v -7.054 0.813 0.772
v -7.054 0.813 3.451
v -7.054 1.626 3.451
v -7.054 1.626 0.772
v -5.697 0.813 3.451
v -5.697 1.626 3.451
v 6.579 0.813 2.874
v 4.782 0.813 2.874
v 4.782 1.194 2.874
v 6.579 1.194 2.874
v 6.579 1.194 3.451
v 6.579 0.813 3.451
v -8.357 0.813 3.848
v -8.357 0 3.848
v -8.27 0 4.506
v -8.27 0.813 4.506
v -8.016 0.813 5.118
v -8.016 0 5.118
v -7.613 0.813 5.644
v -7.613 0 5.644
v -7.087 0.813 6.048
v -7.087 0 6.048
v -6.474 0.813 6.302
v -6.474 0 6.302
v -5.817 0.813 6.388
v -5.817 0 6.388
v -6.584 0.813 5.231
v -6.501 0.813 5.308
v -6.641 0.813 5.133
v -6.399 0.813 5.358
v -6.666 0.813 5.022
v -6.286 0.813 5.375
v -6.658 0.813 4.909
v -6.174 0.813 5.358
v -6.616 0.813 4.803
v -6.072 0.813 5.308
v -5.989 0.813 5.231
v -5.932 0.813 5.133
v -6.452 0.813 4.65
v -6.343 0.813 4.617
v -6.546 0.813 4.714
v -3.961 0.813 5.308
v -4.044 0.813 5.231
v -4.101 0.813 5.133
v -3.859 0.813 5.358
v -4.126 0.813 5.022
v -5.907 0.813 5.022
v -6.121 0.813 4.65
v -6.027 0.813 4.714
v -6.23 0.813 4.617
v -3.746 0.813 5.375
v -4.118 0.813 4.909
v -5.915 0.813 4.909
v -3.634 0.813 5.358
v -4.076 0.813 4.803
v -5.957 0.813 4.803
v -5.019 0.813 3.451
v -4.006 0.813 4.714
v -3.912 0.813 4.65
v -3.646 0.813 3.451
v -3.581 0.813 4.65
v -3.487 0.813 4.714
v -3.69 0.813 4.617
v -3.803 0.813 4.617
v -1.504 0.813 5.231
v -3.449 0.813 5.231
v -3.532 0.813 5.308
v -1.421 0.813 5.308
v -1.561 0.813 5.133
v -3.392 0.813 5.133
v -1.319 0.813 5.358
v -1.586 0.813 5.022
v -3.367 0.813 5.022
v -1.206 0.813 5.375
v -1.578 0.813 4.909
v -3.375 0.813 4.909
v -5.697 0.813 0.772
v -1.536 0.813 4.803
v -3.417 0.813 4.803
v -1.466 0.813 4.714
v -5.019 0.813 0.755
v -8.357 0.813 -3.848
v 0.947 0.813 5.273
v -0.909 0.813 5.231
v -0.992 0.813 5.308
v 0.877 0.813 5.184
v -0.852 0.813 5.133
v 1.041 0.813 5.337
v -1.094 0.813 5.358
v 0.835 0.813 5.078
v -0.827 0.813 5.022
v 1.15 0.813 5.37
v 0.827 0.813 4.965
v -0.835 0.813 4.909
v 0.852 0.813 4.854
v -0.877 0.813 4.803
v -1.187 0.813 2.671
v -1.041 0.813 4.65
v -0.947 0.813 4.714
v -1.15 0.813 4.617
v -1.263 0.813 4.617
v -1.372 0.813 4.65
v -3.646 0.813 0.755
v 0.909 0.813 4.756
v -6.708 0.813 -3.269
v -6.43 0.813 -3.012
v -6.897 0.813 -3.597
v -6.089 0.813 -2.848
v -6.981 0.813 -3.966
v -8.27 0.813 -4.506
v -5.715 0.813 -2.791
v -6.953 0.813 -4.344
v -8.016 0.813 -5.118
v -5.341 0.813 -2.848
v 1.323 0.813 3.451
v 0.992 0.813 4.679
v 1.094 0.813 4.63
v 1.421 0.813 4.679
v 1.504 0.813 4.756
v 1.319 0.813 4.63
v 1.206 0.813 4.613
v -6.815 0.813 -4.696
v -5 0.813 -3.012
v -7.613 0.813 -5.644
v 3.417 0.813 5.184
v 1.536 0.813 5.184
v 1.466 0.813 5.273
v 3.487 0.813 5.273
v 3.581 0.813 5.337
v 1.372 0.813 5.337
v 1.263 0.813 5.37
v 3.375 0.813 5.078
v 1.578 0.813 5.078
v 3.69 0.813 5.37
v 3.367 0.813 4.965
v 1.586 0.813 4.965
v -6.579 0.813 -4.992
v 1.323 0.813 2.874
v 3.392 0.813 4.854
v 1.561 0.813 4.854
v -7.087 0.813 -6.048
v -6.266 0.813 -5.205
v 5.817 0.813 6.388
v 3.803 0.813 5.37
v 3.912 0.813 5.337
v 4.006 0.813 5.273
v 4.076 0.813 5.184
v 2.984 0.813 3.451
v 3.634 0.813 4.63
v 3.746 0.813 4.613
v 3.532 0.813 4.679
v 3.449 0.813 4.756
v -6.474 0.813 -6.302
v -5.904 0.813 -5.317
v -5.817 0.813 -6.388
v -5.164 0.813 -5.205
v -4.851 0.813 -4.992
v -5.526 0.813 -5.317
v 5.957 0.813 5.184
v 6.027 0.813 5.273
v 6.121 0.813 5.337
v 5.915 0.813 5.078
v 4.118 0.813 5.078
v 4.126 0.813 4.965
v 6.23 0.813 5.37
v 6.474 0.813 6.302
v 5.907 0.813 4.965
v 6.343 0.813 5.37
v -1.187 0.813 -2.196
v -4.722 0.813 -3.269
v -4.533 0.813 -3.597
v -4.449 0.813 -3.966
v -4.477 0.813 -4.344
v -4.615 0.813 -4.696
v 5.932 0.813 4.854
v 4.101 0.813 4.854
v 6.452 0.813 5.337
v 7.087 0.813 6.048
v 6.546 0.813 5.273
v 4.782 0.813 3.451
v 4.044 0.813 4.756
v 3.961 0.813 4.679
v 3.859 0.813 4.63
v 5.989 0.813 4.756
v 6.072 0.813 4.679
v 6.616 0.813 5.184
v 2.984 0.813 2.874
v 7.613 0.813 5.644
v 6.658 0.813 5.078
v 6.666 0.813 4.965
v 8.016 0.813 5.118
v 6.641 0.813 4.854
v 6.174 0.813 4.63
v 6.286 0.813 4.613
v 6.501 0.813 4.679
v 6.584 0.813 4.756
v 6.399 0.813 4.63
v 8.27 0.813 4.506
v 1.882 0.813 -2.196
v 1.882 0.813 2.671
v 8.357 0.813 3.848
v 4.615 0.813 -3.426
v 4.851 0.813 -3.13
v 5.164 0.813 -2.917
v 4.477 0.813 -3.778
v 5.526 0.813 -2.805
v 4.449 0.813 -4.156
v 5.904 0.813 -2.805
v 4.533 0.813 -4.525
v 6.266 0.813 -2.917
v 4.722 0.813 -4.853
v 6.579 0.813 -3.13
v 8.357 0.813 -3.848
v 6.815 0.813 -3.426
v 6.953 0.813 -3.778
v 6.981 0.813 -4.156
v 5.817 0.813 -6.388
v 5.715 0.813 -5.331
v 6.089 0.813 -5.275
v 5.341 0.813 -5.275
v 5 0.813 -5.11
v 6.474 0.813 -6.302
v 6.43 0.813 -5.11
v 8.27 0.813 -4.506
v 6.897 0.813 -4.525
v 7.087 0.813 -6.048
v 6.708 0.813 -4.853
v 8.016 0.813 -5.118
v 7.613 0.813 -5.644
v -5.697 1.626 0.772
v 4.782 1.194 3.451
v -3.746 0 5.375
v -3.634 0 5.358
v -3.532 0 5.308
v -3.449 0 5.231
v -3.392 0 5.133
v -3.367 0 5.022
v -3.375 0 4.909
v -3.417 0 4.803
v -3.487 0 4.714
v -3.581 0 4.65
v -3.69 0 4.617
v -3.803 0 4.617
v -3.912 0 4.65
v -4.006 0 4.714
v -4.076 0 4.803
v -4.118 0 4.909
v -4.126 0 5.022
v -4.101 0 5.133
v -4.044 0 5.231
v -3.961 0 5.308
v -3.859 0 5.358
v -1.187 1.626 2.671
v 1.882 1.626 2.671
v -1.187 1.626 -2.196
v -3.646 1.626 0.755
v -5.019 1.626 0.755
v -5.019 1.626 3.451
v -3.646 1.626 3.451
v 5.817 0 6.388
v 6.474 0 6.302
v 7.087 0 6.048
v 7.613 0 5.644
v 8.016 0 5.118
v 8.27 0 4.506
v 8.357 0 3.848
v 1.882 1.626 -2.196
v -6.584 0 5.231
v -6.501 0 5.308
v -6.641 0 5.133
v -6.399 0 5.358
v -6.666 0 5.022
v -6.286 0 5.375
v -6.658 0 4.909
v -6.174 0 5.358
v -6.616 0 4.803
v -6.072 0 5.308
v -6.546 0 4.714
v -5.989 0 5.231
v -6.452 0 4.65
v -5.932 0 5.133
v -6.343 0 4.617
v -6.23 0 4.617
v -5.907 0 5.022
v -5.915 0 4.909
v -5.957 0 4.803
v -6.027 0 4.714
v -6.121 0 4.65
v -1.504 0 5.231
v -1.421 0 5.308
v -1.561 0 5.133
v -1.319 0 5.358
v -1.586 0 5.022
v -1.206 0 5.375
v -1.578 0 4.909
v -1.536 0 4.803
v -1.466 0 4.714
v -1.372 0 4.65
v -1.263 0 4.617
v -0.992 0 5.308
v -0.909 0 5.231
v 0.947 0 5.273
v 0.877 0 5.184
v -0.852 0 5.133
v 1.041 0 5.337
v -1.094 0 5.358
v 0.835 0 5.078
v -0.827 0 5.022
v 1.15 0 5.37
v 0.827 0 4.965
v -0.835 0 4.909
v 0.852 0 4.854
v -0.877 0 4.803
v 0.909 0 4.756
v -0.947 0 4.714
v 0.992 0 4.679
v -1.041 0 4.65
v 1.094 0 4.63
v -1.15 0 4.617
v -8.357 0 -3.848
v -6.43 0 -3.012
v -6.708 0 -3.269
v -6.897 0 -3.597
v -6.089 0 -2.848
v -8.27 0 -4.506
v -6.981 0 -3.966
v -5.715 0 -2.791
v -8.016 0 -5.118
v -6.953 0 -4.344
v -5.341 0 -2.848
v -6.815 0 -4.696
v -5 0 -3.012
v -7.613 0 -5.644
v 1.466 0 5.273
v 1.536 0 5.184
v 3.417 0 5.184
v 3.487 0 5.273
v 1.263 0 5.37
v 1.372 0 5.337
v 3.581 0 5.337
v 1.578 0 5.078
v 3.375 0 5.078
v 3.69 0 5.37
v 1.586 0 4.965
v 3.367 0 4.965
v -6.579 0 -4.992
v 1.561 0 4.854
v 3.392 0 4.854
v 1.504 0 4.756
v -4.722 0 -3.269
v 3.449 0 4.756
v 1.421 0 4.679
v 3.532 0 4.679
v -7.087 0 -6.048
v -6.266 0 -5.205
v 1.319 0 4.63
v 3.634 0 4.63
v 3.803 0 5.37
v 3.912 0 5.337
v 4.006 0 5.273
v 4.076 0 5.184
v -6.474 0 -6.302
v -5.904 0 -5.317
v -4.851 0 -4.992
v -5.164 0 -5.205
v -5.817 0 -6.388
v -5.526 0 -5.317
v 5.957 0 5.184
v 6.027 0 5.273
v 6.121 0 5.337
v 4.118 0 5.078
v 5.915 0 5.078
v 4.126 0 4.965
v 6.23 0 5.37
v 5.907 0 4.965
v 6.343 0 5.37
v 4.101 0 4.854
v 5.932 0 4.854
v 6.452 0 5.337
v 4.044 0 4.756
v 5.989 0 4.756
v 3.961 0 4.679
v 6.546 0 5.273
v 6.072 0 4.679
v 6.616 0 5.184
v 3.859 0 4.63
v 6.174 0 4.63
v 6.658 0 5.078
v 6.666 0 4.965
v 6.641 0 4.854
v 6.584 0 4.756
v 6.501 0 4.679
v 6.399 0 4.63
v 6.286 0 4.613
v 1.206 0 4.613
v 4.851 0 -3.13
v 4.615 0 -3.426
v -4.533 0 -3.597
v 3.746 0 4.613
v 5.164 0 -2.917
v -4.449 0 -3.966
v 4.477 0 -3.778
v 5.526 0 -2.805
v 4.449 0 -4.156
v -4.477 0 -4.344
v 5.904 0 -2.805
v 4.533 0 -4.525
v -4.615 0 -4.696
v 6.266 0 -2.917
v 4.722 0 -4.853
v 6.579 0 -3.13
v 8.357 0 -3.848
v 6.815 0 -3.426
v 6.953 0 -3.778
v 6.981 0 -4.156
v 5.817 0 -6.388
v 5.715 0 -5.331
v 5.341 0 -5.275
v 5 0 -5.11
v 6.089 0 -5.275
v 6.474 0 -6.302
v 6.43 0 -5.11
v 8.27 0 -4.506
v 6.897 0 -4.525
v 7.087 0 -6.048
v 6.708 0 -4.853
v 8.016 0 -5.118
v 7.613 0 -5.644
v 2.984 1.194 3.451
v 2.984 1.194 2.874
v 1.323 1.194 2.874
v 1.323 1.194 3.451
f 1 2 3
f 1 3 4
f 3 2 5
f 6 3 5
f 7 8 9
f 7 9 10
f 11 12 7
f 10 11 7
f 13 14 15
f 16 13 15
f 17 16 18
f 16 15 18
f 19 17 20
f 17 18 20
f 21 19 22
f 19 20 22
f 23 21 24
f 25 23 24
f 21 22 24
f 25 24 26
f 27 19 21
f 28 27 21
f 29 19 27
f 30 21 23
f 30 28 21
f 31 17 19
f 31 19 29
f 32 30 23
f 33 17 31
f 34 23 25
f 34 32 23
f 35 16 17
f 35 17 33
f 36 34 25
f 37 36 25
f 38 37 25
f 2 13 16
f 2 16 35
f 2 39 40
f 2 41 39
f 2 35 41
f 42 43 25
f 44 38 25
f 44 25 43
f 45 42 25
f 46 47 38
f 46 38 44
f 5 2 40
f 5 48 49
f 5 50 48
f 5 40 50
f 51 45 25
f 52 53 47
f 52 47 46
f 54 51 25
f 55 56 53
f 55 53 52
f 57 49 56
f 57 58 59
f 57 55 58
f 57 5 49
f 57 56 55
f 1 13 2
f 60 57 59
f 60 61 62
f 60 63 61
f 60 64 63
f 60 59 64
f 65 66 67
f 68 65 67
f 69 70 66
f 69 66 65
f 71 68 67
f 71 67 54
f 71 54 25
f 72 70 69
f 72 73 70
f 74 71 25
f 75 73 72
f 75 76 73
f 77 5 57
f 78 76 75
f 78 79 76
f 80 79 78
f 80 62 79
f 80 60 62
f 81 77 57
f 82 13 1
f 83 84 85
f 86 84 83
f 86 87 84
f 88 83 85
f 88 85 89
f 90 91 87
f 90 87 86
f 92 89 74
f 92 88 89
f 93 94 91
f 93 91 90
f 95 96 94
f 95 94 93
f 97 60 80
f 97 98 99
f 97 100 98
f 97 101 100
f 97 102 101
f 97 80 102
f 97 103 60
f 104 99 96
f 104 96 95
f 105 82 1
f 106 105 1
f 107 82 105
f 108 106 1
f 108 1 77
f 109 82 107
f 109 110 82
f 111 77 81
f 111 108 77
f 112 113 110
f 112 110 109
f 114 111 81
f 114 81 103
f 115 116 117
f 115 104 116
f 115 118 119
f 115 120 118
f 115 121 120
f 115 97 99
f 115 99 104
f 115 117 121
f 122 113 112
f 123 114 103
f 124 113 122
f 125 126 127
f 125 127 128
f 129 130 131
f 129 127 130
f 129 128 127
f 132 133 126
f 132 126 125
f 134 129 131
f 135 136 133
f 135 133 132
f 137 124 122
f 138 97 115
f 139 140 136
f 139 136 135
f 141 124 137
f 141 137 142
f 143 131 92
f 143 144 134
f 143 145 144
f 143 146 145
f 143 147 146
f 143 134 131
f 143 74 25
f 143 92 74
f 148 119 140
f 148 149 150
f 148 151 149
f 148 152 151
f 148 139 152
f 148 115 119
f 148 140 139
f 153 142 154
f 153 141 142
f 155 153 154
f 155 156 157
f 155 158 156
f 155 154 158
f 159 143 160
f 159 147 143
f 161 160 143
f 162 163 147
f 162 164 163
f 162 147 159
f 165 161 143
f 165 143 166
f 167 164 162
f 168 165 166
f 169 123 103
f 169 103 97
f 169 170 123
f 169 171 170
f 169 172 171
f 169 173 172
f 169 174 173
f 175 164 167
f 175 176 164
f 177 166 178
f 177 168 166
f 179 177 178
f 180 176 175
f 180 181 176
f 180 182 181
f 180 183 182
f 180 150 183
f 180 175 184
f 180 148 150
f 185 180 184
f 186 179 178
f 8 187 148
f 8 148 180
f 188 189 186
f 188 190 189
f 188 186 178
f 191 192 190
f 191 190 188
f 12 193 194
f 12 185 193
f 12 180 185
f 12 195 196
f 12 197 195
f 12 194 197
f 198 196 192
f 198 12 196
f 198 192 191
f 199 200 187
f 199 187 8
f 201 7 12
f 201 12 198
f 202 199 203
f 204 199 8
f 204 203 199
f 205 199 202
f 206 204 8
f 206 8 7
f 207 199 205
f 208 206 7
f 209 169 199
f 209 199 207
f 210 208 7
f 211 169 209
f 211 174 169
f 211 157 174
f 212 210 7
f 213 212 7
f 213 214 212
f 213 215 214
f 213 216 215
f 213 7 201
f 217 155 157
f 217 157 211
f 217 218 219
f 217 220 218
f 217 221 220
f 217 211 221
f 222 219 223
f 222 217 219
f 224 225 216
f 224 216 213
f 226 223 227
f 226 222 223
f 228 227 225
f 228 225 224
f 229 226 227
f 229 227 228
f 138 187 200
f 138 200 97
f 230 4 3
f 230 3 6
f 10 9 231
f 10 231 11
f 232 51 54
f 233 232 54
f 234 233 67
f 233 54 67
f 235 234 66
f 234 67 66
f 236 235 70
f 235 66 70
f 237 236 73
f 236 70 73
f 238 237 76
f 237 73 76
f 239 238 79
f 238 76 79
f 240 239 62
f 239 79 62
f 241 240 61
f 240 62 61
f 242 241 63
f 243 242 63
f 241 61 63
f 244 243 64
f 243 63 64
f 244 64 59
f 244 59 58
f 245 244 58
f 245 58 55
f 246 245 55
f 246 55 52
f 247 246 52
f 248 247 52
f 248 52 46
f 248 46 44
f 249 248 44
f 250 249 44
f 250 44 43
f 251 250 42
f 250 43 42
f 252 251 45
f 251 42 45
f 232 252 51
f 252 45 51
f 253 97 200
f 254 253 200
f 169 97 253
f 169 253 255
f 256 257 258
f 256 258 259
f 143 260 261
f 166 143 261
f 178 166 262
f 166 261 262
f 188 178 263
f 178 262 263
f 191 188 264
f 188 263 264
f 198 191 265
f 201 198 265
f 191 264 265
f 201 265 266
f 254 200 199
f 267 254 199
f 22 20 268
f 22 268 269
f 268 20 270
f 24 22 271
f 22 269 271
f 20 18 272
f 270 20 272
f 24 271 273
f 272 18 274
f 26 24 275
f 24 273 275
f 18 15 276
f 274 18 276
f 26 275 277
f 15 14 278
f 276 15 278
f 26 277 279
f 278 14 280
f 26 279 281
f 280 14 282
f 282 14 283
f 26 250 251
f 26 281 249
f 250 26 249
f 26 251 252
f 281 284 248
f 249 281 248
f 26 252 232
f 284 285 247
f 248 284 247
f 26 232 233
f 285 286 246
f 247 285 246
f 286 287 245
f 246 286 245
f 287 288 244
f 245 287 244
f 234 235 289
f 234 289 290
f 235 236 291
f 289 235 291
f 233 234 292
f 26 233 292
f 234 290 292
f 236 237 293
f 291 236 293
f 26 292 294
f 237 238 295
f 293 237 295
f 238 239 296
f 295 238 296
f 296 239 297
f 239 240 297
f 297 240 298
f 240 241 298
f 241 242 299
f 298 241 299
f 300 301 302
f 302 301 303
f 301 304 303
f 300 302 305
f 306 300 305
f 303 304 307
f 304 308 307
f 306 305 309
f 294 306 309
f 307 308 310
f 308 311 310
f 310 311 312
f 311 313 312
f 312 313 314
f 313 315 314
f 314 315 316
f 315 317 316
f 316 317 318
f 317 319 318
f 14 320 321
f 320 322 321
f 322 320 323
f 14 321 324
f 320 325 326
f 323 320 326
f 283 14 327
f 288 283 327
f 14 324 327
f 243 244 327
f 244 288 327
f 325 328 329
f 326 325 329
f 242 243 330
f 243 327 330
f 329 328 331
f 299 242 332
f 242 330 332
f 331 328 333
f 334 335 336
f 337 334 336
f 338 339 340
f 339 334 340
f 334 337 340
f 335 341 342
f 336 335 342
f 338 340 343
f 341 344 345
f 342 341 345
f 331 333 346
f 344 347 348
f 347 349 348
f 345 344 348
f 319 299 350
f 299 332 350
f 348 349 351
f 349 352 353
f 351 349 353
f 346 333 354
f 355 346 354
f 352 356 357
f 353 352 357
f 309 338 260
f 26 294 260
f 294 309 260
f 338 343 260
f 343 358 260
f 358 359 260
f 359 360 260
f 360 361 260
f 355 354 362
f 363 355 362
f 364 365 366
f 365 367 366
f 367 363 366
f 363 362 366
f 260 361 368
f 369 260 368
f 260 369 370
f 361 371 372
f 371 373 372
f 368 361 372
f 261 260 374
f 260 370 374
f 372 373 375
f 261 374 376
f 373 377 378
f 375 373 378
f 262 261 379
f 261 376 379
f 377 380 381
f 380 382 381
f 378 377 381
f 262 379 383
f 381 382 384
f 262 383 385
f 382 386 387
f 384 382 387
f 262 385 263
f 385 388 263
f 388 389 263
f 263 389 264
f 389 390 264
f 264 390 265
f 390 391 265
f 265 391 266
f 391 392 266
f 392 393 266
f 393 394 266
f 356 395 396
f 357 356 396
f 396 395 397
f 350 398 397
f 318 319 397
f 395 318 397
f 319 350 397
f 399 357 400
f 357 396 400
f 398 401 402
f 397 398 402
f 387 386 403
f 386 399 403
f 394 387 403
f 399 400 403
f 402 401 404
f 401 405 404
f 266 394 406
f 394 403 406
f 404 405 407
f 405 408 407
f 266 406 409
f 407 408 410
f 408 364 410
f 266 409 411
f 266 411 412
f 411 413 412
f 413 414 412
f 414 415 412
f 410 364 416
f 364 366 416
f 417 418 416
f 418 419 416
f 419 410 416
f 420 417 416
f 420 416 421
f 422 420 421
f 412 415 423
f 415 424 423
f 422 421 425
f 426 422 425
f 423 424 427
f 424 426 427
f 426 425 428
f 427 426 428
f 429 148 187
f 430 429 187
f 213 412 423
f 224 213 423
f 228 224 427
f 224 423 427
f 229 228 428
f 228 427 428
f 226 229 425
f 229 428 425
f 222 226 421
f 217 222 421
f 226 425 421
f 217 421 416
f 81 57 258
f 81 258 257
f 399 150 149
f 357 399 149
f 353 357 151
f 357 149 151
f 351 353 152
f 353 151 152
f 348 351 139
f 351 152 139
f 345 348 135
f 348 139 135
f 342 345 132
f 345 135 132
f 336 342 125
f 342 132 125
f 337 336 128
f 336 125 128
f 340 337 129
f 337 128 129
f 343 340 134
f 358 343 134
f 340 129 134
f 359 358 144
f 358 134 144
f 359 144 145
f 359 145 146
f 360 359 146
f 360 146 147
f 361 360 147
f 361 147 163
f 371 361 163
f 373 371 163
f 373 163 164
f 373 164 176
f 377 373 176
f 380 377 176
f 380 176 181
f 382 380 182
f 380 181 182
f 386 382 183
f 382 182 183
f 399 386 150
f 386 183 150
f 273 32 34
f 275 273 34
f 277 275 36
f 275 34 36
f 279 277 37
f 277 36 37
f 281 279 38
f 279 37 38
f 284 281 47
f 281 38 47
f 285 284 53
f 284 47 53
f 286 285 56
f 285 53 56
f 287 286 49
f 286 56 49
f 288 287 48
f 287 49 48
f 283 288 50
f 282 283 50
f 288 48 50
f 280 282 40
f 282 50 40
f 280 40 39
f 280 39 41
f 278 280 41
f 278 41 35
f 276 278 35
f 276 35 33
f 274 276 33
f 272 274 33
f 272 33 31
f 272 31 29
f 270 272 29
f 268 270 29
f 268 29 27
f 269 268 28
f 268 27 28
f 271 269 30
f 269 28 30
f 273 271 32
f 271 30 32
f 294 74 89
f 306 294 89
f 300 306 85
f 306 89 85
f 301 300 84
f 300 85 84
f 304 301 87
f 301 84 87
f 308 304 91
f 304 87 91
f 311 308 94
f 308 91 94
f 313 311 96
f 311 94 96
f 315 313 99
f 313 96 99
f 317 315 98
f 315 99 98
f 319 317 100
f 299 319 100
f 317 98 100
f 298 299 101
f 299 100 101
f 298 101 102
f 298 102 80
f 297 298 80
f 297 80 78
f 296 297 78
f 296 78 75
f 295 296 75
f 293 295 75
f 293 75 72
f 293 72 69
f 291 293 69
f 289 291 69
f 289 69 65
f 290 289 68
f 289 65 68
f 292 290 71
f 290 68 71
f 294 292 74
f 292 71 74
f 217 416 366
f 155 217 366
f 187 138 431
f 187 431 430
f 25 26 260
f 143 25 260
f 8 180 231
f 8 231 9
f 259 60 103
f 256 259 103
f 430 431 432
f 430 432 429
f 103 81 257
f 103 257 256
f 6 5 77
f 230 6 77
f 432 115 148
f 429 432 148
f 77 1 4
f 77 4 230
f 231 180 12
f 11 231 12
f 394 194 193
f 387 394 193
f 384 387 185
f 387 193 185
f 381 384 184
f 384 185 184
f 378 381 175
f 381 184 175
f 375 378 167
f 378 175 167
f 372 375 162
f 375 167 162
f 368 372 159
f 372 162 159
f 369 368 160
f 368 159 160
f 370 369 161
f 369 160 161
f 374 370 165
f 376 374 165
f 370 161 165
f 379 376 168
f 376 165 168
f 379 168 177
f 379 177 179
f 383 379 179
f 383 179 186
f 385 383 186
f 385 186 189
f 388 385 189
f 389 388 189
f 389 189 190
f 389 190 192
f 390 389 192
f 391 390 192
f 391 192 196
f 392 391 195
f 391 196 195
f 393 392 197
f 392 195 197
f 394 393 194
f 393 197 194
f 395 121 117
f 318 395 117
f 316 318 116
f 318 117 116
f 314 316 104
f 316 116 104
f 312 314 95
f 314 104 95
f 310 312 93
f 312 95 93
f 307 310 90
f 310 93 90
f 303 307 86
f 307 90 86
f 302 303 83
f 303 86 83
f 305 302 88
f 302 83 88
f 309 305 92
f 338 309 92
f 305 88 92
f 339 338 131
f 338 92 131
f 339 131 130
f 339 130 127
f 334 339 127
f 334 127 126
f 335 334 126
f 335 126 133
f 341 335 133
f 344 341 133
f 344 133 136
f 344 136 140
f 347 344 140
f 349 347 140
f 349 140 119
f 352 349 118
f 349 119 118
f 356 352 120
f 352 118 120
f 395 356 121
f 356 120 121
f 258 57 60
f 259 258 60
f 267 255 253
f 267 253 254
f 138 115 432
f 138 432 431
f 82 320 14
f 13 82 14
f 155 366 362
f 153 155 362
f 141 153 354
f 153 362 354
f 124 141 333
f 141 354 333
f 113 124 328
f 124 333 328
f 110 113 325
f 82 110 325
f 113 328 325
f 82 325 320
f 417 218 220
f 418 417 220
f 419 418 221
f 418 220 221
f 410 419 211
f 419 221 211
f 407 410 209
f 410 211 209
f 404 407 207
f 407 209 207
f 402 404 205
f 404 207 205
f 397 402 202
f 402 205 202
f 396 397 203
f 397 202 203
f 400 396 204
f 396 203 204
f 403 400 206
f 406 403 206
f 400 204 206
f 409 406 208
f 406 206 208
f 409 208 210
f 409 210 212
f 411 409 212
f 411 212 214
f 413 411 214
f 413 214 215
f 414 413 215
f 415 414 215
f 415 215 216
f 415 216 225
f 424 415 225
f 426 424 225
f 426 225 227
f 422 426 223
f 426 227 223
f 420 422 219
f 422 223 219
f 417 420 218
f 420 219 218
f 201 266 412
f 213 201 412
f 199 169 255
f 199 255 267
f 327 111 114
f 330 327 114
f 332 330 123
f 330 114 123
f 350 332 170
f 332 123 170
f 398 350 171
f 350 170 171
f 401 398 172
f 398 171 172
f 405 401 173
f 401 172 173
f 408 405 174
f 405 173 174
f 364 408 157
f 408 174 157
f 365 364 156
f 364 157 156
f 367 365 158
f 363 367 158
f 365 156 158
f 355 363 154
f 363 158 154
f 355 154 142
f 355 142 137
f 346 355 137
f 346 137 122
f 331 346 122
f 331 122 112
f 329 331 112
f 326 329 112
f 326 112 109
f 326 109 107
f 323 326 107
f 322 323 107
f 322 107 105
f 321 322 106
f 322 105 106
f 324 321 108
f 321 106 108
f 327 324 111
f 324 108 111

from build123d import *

# Parameters (mm, degrees)
BOSS_EXTRUDE1_DEPTH = 0.8128
SKETCH2_R           = 0.381
SKETCH2_R_2         = 1.27
CUT_EXTRUDE1_DEPTH  = 0.8128
SKETCH4_W           = 3.069128824
SKETCH4_H           = 4.866519185
SKETCH4_W_2         = 1.37347754
SKETCH4_H_2         = 2.696085542
SKETCH4_W_3         = 1.356521027
SKETCH4_H_3         = 2.679129029
BOSS_EXTRUDE2_DEPTH = 0.8128
SKETCH4_3_W         = 1.661738258
SKETCH4_3_H         = 0.576521436
SKETCH4_3_W_2       = 1.797390361
BOSS_EXTRUDE3_DEPTH = 0.381


with BuildPart() as part:
    # Sketch1 → Boss-Extrude1 (new body)
    with BuildSketch(Plane(origin=(0, 0, 0), x_dir=(1, 0, 0), z_dir=(0, 1, 0))):
        with BuildLine():
            Line((5.8166, 6.3881), (-5.8166, 6.3881))
            ThreePointArc((-5.8166, 6.3881), (-7.612651224, 5.644151224), (-8.3566, 3.8481))
            Line((-8.3566, 3.8481), (-8.3566, -3.8481))
            ThreePointArc((-8.3566, -3.8481), (-7.612651224, -5.644151224), (-5.8166, -6.3881))
            Line((-5.8166, -6.3881), (5.8166, -6.3881))
            ThreePointArc((5.8166, -6.3881), (7.612651224, -5.644151224), (8.3566, -3.8481))
            Line((8.3566, -3.8481), (8.3566, 3.8481))
            ThreePointArc((8.3566, 3.8481), (7.612651224, 5.644151224), (5.8166, 6.3881))
        make_face()
    extrude(amount=BOSS_EXTRUDE1_DEPTH)

    # Sketch2 → Cut-Extrude1 (cut)
    with BuildSketch(Plane(origin=(0, 0.8128, 0), x_dir=(1, 0, 0), z_dir=(0, 1, 0))):
        with Locations(Location((-1.2065, -4.993693032, 0), (0, 0, 270))):
            Circle(SKETCH2_R)
        with Locations(Location((-5.715, 4.061084825, 0), (0, 0, 270))):
            Circle(SKETCH2_R_2)
        with Locations(Location((-3.7465, -4.993693032, 0), (0, 0, 270))):
            Circle(SKETCH2_R)
        with Locations(Location((-6.2865, -4.993693032, 0), (0, 0, 270))):
            Circle(SKETCH2_R)
        with Locations(Location((6.2865, -4.993693032, 0), (0, 0, 90))):
            Circle(SKETCH2_R)
        with Locations(Location((3.7465, -4.993693032, 0), (0, 0, 90))):
            Circle(SKETCH2_R)
        with Locations(Location((5.715, 4.061084825, 0), (0, 0, 90))):
            Circle(SKETCH2_R_2)
        with Locations(Location((1.2065, -4.993693032, 0), (0, 0, 90))):
            Circle(SKETCH2_R)
    extrude(amount=-CUT_EXTRUDE1_DEPTH, mode=Mode.SUBTRACT)

    # Sketch4 → Boss-Extrude2 (add)
    with BuildSketch(Plane(origin=(0, 0.8128, 0), x_dir=(1, 0, 0), z_dir=(0, 1, 0))):
        with Locations((0.347608513, -0.237391179)):
            Rectangle(SKETCH4_W, SKETCH4_H)
        with Locations((-4.332389031, -2.102607592)):
            Rectangle(SKETCH4_W_2, SKETCH4_H_2)
        with Locations((-6.375648829, -2.111085849)):
            Rectangle(SKETCH4_W_3, SKETCH4_H_3)
    extrude(amount=BOSS_EXTRUDE2_DEPTH)

    # Sketch4<3> → Boss-Extrude3 (add)
    with BuildSketch(Plane(origin=(0, 0.8128, 0), x_dir=(1, 0, 0), z_dir=(0, 1, 0))):
        with Locations((2.153477131, -3.162389645)):
            Rectangle(SKETCH4_3_W, SKETCH4_3_H)
        with Locations((5.680431802, -3.162389645)):
            Rectangle(SKETCH4_3_W_2, SKETCH4_3_H)
    extrude(amount=BOSS_EXTRUDE3_DEPTH)


solid = part.part
